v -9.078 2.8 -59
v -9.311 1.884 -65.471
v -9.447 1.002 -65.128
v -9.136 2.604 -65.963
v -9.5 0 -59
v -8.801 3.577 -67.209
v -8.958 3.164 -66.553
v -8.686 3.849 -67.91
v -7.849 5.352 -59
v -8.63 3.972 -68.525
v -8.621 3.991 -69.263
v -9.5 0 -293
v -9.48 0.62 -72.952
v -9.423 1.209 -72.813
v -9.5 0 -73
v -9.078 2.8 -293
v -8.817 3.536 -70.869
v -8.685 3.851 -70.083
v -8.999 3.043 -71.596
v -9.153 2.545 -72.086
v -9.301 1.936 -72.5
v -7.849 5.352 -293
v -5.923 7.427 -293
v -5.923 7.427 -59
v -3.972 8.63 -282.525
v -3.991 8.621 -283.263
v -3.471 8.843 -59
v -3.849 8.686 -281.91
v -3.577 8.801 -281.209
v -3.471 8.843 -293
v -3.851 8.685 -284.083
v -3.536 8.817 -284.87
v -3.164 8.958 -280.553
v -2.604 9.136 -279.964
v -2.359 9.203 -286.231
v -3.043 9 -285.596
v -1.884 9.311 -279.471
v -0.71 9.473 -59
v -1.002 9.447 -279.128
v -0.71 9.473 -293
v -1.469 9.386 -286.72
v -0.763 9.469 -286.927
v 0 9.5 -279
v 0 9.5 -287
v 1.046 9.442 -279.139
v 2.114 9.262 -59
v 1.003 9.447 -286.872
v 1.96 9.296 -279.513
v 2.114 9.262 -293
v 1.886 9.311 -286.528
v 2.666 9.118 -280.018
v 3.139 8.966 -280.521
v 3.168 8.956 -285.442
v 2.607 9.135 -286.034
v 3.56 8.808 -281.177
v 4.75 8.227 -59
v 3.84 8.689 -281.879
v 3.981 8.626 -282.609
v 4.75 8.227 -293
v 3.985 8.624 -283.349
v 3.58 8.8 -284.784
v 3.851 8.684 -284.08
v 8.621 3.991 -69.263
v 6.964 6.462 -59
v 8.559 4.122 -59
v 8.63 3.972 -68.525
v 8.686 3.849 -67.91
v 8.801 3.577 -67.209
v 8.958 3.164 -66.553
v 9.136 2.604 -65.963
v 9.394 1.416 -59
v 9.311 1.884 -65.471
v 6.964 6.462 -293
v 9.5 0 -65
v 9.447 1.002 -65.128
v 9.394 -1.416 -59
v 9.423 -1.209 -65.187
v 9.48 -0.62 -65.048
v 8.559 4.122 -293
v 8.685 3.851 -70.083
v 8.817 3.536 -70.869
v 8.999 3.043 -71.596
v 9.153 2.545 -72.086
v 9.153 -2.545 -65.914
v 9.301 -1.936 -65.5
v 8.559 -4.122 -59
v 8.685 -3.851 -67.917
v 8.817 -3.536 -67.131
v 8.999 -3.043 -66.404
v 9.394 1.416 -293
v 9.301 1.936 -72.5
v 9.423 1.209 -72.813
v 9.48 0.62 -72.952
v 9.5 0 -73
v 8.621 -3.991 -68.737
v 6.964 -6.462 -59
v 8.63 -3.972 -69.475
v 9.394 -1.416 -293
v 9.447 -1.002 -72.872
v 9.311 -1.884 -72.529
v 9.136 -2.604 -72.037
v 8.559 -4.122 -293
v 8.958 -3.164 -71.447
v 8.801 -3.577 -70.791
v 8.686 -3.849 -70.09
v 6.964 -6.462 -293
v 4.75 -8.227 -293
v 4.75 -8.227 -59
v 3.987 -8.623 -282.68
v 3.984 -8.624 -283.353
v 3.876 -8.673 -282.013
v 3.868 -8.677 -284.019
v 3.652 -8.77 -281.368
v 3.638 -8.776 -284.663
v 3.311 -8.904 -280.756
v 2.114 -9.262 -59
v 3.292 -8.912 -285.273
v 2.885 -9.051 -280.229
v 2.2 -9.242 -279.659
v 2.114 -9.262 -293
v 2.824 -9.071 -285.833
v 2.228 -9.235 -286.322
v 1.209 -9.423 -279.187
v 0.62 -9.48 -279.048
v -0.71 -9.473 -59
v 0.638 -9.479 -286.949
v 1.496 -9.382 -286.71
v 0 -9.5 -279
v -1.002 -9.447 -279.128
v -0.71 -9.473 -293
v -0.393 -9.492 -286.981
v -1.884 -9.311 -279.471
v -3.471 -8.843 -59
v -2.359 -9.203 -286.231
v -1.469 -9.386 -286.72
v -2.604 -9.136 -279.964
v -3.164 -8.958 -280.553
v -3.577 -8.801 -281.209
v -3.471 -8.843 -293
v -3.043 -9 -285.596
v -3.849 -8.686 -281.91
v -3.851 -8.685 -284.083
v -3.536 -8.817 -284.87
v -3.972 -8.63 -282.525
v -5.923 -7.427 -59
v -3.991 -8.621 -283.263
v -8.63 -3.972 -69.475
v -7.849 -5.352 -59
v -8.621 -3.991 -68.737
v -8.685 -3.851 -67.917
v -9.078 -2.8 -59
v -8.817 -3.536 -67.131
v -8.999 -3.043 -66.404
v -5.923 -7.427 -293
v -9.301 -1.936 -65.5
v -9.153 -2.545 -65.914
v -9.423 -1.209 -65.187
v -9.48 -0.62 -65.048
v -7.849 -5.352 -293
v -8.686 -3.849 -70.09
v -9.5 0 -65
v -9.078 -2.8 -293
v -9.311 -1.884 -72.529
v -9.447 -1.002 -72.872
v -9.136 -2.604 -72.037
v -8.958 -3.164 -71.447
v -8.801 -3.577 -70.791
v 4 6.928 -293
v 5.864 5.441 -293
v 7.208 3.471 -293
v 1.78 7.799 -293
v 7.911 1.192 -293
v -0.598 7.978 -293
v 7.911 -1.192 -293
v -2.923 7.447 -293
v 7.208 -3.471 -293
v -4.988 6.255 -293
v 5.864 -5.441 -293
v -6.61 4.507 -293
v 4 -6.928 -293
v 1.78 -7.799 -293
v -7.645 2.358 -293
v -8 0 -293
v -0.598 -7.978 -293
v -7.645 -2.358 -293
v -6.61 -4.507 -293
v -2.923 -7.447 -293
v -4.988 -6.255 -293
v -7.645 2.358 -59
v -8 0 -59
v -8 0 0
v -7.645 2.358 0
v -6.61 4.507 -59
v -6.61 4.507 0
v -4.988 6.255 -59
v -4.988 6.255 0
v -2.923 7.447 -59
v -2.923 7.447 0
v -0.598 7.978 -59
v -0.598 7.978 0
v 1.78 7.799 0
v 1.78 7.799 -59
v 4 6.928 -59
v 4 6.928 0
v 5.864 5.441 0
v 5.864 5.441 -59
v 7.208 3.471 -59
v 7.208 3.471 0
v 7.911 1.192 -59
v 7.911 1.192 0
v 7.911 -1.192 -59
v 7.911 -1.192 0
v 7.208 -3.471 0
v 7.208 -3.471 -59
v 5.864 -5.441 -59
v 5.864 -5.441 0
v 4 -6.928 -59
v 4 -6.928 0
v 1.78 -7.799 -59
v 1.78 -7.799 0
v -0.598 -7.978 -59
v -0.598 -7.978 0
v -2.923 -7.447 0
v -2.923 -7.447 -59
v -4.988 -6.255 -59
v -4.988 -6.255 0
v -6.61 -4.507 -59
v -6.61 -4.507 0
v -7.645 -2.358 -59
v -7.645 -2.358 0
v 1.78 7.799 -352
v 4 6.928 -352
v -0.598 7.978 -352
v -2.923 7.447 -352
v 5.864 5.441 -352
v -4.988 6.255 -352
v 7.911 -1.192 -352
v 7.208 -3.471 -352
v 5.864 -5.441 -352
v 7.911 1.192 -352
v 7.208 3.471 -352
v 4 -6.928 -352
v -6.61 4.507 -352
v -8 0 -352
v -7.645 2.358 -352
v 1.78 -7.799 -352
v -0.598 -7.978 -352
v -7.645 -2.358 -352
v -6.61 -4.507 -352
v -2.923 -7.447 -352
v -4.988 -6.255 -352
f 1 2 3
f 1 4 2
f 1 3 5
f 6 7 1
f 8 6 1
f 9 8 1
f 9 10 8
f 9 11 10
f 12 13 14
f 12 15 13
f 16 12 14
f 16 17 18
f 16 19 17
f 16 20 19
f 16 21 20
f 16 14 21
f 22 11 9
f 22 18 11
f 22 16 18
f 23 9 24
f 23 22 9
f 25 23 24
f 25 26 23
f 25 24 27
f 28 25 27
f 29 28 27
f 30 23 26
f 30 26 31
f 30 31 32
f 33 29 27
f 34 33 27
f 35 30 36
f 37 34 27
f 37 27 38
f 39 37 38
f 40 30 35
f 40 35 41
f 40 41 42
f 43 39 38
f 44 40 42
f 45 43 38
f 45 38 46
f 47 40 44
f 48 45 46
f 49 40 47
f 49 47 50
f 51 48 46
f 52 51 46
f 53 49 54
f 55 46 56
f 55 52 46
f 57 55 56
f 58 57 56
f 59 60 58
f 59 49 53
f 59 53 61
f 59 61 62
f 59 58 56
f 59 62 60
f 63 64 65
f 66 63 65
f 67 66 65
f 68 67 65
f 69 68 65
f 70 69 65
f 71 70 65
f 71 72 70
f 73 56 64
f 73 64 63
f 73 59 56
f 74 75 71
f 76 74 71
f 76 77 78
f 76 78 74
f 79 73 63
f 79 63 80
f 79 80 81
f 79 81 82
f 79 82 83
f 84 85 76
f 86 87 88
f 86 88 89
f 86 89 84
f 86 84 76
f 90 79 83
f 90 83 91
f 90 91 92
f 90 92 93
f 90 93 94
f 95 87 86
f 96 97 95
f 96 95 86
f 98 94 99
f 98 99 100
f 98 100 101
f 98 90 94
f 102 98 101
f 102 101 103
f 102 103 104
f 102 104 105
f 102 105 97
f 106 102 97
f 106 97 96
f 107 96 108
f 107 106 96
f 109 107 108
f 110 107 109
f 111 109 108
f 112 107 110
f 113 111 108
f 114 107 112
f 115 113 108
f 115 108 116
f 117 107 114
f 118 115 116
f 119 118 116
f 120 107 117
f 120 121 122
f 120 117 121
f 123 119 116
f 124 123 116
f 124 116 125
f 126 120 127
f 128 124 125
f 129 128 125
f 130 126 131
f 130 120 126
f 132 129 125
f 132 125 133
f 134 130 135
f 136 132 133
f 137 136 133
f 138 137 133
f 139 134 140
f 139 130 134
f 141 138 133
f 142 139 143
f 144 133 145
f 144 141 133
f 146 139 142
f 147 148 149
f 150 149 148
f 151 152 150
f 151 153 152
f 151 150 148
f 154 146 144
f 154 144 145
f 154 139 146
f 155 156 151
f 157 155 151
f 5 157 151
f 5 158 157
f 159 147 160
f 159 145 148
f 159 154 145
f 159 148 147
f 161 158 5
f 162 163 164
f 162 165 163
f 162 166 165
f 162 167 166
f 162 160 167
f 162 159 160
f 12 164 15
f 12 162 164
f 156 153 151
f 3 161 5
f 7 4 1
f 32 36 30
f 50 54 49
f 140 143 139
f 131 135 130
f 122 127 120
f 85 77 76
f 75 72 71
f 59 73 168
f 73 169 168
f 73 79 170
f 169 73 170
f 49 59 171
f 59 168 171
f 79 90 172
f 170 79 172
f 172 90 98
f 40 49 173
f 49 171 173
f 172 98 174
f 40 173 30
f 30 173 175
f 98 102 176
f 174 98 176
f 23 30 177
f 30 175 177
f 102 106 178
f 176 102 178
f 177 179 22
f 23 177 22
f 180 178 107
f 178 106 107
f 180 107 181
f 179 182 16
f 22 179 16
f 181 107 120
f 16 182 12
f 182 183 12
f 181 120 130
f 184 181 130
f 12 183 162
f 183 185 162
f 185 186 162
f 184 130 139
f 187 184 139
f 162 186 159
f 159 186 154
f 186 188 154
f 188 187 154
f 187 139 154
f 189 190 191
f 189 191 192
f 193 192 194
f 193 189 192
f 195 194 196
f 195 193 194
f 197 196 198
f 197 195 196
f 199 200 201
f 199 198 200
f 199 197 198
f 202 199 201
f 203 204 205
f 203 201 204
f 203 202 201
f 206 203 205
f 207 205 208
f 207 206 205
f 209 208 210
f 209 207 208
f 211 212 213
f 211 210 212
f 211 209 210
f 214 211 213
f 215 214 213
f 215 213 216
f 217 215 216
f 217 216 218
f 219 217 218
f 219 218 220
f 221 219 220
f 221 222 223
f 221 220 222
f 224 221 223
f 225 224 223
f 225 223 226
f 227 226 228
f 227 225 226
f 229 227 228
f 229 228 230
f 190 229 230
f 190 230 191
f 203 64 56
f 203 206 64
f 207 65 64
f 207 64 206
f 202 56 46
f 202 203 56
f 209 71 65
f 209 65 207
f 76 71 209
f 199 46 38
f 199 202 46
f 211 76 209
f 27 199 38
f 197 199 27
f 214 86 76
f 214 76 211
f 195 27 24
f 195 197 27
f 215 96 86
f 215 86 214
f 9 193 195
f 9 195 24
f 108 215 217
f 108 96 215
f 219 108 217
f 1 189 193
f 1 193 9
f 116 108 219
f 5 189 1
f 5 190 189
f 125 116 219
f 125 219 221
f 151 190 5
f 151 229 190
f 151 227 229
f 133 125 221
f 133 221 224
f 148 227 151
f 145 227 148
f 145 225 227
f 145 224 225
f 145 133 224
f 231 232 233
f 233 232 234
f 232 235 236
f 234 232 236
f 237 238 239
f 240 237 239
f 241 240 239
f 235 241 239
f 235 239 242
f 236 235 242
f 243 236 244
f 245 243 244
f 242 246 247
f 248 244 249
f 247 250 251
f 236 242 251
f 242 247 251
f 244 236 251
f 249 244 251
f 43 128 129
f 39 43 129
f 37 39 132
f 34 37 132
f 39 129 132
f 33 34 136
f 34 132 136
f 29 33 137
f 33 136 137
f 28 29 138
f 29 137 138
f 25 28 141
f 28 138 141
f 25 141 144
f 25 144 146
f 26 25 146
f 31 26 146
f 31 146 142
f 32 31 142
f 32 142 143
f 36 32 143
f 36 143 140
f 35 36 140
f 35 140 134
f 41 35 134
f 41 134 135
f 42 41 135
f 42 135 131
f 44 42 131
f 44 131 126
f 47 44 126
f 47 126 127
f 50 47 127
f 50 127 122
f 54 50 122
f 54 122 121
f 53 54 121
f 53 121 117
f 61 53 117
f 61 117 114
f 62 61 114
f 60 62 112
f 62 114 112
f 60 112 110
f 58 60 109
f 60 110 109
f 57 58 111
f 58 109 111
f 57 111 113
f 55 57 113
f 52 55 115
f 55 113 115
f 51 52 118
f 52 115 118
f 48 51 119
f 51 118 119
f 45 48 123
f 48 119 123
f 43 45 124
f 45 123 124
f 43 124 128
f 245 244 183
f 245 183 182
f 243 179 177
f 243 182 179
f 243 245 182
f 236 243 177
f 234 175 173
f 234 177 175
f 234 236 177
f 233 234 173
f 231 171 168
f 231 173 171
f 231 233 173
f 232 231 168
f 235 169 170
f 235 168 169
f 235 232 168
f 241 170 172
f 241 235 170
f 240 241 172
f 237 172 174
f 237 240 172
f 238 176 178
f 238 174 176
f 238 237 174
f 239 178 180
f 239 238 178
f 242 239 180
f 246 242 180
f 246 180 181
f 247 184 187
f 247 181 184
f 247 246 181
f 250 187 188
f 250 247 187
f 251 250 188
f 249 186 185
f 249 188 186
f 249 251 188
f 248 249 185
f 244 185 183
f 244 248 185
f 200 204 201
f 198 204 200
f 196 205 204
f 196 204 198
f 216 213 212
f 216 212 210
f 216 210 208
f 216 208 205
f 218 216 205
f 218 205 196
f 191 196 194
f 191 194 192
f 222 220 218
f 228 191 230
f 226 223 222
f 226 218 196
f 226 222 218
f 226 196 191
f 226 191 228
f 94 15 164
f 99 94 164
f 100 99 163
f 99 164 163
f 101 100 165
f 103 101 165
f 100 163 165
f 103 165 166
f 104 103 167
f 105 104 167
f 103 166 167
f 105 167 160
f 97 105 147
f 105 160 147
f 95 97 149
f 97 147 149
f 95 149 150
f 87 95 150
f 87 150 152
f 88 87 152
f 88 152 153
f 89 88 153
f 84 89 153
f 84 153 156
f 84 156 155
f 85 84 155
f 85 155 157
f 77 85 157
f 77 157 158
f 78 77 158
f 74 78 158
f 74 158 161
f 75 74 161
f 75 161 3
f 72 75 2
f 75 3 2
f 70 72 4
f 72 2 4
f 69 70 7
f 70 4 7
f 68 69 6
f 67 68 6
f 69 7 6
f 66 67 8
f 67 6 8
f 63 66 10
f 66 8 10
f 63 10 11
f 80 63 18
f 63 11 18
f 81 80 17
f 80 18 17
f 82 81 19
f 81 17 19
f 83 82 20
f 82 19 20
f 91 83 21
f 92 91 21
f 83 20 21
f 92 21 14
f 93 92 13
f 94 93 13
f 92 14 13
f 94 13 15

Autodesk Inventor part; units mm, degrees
ref_plane "XY Plane" through (0, 0, 0) normal (0, 0, 1) x (1, 0, 0)
sketch "Skizze1" plane through (0, 0, 0) normal (0, 1, 0) x (-1, 0, 0)
  line L0 (0, 0) -> (8, 0)
  line L1 (8, 0) -> (8, -59)
  line L2 (8, -59) -> (9.5, -59)
  line L3 (9.5, -59) -> (9.5, -293)
  line L4 (9.5, -293) -> (8, -293)
  line L5 (8, -293) -> (8, -352)
  line L6 (8, -352) -> (0, -352)
  line L7 (0, -352) -> (0, 0)
  dimension "d0" = 16
  dimension "d1" = 59
  dimension "d2" = 59
  dimension "d3" = 352
  dimension "d4" = 19
revolve "Umdrehung1" add sketch "Skizze1" angle 360 about axis through (0, 0, -352) along (0, 0, 1)
ref_plane "Arbeitsebene1" through (9.5, 0, 0) normal (1, 0, 0) x (0, 1, 0)
sketch "Skizze2" plane through (9.5, 0, 0) normal (1, 0, 0) x (0, 1, 0)
  line L0 (8, 0) -> (-8, 0) projected
  point P0 (0, 0)
  point P1 (0, -69)
  point P2 (0, 0)
  dimension "d7" = 69
hole "Bohrung1" at (9.5, 0, -69) direction (-1, 0, 0) diameter 8 end through all
ref_plane "Arbeitsebene2" through (0, 9.5, 0) normal (0, 1, 0) x (-1, 0, 0)
sketch "Skizze3" plane through (0, 9.5, 0) normal (0, 1, 0) x (-1, 0, 0)
  line L0 (9.5, -293) -> (-9.5, -293) projected
  point P0 (0, 0)
  point P1 (0, -283)
  dimension "d16" = 10
hole "Bohrung2" at (0, 9.5, -283) direction (0, -1, 0) diameter 8 end through all
properties part number "2011"
